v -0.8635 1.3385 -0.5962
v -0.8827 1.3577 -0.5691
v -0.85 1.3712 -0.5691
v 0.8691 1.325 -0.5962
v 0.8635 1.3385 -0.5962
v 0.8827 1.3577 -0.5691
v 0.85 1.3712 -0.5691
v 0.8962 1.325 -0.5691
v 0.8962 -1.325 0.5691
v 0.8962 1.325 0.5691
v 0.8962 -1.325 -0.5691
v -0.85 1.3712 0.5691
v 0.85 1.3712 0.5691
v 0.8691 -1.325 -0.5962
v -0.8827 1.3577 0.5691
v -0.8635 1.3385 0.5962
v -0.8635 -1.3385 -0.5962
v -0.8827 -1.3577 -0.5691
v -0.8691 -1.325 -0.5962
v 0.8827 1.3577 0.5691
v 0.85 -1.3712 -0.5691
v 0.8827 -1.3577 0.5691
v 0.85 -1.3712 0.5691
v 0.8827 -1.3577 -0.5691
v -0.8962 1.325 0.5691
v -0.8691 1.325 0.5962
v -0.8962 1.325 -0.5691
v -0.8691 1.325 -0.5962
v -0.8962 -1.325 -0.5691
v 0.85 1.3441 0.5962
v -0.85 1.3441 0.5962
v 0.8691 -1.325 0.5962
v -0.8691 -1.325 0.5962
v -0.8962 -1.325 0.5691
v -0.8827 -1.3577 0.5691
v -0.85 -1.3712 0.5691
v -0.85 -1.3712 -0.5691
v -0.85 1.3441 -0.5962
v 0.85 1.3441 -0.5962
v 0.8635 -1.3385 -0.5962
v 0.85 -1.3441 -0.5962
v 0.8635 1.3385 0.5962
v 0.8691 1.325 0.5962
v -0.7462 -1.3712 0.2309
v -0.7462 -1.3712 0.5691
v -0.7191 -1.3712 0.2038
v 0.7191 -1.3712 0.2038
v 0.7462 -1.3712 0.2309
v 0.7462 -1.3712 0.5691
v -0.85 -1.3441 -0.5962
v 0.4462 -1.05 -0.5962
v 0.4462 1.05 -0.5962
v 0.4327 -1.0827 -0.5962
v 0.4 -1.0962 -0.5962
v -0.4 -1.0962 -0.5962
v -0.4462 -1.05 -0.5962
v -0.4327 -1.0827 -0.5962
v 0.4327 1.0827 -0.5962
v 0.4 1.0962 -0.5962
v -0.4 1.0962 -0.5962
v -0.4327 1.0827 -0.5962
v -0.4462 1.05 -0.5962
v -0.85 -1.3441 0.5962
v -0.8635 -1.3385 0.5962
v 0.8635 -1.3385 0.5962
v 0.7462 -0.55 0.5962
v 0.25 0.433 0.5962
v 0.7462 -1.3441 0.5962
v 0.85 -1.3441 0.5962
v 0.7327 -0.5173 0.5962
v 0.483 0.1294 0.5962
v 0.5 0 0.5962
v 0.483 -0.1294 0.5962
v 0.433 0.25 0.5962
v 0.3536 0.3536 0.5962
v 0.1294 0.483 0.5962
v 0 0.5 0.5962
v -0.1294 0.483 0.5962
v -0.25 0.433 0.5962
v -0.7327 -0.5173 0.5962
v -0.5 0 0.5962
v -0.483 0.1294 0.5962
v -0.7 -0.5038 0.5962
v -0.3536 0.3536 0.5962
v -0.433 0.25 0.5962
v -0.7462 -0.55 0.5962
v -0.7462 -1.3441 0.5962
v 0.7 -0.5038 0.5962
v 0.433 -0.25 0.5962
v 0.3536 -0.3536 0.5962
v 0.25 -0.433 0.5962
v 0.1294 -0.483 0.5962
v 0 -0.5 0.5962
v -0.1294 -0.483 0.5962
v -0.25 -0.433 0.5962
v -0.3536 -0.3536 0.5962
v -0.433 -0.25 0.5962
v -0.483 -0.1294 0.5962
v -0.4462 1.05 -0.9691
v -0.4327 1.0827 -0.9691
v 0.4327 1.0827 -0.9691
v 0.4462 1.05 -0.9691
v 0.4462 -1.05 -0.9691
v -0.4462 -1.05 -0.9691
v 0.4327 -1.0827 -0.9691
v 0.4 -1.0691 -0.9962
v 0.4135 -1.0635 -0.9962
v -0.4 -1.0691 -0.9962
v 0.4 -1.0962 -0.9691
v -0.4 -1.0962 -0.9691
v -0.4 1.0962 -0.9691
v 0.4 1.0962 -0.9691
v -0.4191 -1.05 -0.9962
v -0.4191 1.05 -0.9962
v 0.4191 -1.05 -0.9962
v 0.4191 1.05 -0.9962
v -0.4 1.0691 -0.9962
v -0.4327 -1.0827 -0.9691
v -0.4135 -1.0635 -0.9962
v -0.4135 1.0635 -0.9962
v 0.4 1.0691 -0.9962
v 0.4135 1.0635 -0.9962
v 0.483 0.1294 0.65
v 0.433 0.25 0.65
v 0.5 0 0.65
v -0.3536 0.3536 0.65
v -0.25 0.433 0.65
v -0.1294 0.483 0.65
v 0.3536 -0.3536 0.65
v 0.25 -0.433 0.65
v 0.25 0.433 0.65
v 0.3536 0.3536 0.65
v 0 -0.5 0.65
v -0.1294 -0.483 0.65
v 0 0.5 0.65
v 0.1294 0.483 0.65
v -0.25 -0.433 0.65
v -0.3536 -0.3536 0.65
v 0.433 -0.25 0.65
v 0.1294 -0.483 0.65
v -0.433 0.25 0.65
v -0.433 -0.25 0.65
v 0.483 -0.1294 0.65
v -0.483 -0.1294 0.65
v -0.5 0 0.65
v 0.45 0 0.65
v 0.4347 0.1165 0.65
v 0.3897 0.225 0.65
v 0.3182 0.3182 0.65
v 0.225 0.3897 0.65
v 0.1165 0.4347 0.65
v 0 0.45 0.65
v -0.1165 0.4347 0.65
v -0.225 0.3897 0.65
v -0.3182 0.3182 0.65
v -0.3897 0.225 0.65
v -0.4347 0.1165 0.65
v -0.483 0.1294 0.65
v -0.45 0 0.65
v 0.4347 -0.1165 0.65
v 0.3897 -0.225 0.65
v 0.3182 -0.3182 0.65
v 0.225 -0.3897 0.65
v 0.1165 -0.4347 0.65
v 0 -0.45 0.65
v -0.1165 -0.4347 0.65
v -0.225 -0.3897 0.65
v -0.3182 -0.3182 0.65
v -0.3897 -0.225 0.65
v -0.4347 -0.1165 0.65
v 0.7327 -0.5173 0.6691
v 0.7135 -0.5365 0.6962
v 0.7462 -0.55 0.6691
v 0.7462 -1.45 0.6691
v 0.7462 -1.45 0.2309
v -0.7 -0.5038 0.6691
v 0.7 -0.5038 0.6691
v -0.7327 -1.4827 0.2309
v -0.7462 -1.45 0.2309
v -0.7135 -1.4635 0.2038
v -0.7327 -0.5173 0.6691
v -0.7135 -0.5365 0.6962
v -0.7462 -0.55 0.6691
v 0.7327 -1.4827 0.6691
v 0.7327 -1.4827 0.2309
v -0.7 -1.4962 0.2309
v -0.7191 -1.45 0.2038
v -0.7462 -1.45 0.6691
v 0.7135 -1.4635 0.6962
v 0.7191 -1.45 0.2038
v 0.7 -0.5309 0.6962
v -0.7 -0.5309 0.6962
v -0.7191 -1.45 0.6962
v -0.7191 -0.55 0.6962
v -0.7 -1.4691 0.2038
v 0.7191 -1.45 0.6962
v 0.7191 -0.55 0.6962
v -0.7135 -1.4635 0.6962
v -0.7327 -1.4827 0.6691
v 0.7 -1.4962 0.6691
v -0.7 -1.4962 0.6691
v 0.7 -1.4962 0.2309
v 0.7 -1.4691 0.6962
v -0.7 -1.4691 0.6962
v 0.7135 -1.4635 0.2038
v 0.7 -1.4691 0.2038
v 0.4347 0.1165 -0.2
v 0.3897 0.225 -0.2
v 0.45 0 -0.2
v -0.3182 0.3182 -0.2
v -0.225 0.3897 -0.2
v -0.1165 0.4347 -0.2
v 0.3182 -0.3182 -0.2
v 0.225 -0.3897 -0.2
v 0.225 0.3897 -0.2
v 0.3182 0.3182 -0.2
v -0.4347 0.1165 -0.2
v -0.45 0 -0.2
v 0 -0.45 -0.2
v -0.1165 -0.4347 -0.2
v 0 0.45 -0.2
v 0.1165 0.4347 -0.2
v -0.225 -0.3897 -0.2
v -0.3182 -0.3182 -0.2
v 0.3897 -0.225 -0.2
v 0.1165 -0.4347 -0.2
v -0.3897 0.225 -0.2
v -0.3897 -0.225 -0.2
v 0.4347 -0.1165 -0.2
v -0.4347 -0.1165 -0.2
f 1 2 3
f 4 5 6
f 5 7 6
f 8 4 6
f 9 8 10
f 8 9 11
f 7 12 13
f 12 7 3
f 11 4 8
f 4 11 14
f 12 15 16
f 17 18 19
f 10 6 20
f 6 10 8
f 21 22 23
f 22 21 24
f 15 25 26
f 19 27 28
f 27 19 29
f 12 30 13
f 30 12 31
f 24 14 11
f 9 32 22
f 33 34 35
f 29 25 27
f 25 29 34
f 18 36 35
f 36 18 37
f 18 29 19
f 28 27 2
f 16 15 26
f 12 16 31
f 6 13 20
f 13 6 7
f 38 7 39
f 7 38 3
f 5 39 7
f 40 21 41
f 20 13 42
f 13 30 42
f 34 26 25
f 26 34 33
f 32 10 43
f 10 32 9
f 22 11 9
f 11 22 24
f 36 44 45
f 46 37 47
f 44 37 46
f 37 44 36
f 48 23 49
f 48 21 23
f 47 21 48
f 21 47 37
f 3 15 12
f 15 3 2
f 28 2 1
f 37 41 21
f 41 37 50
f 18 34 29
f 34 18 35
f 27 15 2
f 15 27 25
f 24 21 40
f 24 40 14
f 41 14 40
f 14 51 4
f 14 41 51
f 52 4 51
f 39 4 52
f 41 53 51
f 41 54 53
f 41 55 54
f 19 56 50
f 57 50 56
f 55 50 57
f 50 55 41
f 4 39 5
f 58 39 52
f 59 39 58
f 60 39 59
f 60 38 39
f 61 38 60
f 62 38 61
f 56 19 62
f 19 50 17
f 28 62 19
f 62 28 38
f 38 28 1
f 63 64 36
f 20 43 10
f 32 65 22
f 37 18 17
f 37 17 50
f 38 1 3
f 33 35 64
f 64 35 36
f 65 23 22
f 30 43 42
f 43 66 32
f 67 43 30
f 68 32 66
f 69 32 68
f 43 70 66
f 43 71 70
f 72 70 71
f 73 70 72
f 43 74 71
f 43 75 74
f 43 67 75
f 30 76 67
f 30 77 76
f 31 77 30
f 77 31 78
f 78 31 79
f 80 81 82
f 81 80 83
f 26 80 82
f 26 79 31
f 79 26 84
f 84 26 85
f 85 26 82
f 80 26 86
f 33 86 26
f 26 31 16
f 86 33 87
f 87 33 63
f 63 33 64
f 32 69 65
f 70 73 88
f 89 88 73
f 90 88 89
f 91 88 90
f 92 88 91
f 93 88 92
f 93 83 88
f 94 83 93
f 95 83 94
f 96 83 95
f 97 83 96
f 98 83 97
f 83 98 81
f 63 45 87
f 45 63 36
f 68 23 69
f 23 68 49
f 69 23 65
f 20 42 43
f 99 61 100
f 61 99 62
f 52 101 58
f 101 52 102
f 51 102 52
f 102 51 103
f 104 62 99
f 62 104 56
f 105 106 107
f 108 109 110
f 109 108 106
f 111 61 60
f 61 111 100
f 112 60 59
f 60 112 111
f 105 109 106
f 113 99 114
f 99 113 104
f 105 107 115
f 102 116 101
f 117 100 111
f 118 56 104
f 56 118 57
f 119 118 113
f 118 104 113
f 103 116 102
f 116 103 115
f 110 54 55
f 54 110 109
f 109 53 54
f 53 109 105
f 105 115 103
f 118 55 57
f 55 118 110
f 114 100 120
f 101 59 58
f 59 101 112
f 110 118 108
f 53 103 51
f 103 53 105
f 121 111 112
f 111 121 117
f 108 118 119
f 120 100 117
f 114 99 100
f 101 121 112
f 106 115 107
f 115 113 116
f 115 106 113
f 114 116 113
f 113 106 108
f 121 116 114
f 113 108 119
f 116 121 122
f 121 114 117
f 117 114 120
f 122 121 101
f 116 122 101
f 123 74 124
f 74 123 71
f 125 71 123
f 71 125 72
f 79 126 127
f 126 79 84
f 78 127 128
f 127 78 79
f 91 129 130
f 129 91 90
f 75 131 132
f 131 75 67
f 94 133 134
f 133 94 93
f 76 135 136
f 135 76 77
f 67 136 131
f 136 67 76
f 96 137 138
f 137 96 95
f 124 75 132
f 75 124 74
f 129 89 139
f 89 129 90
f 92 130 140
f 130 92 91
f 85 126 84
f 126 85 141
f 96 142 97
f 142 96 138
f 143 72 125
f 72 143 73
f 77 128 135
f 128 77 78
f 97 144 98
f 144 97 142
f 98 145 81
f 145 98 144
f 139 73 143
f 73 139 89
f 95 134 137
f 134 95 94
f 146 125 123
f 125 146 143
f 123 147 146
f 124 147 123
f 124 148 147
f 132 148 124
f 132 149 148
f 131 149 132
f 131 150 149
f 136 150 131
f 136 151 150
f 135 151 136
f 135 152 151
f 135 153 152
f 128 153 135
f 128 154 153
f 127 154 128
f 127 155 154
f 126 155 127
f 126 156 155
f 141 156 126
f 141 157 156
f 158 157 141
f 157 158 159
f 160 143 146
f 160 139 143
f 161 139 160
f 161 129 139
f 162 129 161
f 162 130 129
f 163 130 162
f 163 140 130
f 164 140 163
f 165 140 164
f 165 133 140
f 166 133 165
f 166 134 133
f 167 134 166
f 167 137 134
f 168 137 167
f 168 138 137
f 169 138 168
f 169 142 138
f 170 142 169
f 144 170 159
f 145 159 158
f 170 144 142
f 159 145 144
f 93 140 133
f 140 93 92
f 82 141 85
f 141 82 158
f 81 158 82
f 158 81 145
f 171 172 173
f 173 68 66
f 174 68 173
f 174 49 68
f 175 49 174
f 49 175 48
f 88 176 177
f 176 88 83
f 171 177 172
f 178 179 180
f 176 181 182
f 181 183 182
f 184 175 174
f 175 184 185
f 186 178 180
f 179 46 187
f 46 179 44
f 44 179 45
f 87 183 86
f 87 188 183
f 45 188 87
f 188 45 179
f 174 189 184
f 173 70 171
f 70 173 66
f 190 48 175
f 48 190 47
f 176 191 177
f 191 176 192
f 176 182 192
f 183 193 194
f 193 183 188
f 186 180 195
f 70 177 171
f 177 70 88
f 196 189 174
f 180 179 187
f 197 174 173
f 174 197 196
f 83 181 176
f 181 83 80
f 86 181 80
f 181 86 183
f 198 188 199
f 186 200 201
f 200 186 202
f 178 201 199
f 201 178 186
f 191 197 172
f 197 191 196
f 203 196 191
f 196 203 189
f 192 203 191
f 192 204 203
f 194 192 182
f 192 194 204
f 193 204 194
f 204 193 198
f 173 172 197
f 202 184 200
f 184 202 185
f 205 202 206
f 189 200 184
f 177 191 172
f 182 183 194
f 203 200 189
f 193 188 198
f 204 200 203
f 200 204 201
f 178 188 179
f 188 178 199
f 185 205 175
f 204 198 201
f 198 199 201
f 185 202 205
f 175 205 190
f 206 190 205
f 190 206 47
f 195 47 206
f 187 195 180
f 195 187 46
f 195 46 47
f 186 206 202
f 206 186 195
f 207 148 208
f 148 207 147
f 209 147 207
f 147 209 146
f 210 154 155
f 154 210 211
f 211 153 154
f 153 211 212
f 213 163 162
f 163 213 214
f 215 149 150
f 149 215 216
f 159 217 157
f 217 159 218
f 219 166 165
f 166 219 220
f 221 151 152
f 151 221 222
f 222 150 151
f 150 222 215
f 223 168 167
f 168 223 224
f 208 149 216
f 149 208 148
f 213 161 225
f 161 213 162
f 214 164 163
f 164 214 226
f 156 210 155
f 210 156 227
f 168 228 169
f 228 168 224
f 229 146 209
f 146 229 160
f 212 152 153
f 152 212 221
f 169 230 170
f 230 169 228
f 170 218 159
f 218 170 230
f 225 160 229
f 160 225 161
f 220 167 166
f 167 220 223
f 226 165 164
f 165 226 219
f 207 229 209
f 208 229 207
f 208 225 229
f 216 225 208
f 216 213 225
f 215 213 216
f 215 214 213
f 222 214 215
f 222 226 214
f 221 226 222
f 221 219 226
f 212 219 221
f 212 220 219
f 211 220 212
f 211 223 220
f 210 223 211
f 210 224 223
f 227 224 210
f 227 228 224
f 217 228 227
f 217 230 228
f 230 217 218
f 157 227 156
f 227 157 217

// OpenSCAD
// file: lib.scad
function x(v) = v[0];
function y(v) = v[1];
function z(v) = v[2];
function add(v1,v2) = [ for (i = [ 0 : len(v1)-1 ]) v1[i] + v2[i] ];
function xv(d) = [d,0,0];
function yv(d) = [0,d,0];
function zv(d) = [0,0,d];

module box(v) { cube(size=v, center=true); }
module cyl(r1,r2,h) { cylinder(r1=r1, r2=r2, h=h, center=true); }

function grow(n,v) = [x(v)+n*2, y(v)+n*2, z(v)+n*2];

module rbox(v, radius=1) {
	cx = x(v)/2-radius;
	cy = y(v)/2-radius;
	cz = z(v)/2-radius;

	hull() {
		translate([cx,cy,cz]) sphere(r=radius);
		translate([cx,cy,-cz]) sphere(r=radius);
		translate([cx,-cy,cz]) sphere(r=radius);
		translate([cx,-cy,-cz]) sphere(r=radius);
		translate([-cx,cy,cz]) sphere(r=radius);
		translate([-cx,cy,-cz]) sphere(r=radius);
		translate([-cx,-cy,cz]) sphere(r=radius);
		translate([-cx,-cy,-cz]) sphere(r=radius);
	}
}

module fillet(r=1) {
  minkowski() {
    difference() {
      children();
      minkowski() {
        difference() {
          minkowski() {
            children();
            sphere(r=r);
          }
          children();
        }
        sphere(r=r);
      }
    }
    sphere(r=r);
  }
}
// main file
use <lib.scad>

bounds = [2,3,2];
body = [1.8, 2.75, 1.2];

module chassisEngineer() {
	difference() {
		union() {
			rbox(body, 0.05, $fn=8);
			translate([0,0,-0.4]) rbox([x(body)*0.5, y(body)*0.8, z(body)], 0.05, $fn=8);
			translate([0,0,0.15]) cyl(0.5, 0.5, 1.0, $fn=24);
			translate([0,-1,0.45]) rbox([1.5,1,0.5], 0.05, $fn=8);
		};
		#translate([0,0,0.3]) cyl(0.45, 0.45, 1.0, $fn=24);
	};
}

module chassisHauler() {
	difference() {
		union() {
			rbox(body, 0.05, $fn=8);
			translate([0,0,-0.4]) rbox([x(body)*0.5, y(body)*0.8, z(body)], 0.05, $fn=8);
		};
	};
}

module wheel() {
	rotate([0,90,0]) cyl(0.25, 0.25, 0.35, $fn=24);
}

chassisEngineer();
//wheel();
